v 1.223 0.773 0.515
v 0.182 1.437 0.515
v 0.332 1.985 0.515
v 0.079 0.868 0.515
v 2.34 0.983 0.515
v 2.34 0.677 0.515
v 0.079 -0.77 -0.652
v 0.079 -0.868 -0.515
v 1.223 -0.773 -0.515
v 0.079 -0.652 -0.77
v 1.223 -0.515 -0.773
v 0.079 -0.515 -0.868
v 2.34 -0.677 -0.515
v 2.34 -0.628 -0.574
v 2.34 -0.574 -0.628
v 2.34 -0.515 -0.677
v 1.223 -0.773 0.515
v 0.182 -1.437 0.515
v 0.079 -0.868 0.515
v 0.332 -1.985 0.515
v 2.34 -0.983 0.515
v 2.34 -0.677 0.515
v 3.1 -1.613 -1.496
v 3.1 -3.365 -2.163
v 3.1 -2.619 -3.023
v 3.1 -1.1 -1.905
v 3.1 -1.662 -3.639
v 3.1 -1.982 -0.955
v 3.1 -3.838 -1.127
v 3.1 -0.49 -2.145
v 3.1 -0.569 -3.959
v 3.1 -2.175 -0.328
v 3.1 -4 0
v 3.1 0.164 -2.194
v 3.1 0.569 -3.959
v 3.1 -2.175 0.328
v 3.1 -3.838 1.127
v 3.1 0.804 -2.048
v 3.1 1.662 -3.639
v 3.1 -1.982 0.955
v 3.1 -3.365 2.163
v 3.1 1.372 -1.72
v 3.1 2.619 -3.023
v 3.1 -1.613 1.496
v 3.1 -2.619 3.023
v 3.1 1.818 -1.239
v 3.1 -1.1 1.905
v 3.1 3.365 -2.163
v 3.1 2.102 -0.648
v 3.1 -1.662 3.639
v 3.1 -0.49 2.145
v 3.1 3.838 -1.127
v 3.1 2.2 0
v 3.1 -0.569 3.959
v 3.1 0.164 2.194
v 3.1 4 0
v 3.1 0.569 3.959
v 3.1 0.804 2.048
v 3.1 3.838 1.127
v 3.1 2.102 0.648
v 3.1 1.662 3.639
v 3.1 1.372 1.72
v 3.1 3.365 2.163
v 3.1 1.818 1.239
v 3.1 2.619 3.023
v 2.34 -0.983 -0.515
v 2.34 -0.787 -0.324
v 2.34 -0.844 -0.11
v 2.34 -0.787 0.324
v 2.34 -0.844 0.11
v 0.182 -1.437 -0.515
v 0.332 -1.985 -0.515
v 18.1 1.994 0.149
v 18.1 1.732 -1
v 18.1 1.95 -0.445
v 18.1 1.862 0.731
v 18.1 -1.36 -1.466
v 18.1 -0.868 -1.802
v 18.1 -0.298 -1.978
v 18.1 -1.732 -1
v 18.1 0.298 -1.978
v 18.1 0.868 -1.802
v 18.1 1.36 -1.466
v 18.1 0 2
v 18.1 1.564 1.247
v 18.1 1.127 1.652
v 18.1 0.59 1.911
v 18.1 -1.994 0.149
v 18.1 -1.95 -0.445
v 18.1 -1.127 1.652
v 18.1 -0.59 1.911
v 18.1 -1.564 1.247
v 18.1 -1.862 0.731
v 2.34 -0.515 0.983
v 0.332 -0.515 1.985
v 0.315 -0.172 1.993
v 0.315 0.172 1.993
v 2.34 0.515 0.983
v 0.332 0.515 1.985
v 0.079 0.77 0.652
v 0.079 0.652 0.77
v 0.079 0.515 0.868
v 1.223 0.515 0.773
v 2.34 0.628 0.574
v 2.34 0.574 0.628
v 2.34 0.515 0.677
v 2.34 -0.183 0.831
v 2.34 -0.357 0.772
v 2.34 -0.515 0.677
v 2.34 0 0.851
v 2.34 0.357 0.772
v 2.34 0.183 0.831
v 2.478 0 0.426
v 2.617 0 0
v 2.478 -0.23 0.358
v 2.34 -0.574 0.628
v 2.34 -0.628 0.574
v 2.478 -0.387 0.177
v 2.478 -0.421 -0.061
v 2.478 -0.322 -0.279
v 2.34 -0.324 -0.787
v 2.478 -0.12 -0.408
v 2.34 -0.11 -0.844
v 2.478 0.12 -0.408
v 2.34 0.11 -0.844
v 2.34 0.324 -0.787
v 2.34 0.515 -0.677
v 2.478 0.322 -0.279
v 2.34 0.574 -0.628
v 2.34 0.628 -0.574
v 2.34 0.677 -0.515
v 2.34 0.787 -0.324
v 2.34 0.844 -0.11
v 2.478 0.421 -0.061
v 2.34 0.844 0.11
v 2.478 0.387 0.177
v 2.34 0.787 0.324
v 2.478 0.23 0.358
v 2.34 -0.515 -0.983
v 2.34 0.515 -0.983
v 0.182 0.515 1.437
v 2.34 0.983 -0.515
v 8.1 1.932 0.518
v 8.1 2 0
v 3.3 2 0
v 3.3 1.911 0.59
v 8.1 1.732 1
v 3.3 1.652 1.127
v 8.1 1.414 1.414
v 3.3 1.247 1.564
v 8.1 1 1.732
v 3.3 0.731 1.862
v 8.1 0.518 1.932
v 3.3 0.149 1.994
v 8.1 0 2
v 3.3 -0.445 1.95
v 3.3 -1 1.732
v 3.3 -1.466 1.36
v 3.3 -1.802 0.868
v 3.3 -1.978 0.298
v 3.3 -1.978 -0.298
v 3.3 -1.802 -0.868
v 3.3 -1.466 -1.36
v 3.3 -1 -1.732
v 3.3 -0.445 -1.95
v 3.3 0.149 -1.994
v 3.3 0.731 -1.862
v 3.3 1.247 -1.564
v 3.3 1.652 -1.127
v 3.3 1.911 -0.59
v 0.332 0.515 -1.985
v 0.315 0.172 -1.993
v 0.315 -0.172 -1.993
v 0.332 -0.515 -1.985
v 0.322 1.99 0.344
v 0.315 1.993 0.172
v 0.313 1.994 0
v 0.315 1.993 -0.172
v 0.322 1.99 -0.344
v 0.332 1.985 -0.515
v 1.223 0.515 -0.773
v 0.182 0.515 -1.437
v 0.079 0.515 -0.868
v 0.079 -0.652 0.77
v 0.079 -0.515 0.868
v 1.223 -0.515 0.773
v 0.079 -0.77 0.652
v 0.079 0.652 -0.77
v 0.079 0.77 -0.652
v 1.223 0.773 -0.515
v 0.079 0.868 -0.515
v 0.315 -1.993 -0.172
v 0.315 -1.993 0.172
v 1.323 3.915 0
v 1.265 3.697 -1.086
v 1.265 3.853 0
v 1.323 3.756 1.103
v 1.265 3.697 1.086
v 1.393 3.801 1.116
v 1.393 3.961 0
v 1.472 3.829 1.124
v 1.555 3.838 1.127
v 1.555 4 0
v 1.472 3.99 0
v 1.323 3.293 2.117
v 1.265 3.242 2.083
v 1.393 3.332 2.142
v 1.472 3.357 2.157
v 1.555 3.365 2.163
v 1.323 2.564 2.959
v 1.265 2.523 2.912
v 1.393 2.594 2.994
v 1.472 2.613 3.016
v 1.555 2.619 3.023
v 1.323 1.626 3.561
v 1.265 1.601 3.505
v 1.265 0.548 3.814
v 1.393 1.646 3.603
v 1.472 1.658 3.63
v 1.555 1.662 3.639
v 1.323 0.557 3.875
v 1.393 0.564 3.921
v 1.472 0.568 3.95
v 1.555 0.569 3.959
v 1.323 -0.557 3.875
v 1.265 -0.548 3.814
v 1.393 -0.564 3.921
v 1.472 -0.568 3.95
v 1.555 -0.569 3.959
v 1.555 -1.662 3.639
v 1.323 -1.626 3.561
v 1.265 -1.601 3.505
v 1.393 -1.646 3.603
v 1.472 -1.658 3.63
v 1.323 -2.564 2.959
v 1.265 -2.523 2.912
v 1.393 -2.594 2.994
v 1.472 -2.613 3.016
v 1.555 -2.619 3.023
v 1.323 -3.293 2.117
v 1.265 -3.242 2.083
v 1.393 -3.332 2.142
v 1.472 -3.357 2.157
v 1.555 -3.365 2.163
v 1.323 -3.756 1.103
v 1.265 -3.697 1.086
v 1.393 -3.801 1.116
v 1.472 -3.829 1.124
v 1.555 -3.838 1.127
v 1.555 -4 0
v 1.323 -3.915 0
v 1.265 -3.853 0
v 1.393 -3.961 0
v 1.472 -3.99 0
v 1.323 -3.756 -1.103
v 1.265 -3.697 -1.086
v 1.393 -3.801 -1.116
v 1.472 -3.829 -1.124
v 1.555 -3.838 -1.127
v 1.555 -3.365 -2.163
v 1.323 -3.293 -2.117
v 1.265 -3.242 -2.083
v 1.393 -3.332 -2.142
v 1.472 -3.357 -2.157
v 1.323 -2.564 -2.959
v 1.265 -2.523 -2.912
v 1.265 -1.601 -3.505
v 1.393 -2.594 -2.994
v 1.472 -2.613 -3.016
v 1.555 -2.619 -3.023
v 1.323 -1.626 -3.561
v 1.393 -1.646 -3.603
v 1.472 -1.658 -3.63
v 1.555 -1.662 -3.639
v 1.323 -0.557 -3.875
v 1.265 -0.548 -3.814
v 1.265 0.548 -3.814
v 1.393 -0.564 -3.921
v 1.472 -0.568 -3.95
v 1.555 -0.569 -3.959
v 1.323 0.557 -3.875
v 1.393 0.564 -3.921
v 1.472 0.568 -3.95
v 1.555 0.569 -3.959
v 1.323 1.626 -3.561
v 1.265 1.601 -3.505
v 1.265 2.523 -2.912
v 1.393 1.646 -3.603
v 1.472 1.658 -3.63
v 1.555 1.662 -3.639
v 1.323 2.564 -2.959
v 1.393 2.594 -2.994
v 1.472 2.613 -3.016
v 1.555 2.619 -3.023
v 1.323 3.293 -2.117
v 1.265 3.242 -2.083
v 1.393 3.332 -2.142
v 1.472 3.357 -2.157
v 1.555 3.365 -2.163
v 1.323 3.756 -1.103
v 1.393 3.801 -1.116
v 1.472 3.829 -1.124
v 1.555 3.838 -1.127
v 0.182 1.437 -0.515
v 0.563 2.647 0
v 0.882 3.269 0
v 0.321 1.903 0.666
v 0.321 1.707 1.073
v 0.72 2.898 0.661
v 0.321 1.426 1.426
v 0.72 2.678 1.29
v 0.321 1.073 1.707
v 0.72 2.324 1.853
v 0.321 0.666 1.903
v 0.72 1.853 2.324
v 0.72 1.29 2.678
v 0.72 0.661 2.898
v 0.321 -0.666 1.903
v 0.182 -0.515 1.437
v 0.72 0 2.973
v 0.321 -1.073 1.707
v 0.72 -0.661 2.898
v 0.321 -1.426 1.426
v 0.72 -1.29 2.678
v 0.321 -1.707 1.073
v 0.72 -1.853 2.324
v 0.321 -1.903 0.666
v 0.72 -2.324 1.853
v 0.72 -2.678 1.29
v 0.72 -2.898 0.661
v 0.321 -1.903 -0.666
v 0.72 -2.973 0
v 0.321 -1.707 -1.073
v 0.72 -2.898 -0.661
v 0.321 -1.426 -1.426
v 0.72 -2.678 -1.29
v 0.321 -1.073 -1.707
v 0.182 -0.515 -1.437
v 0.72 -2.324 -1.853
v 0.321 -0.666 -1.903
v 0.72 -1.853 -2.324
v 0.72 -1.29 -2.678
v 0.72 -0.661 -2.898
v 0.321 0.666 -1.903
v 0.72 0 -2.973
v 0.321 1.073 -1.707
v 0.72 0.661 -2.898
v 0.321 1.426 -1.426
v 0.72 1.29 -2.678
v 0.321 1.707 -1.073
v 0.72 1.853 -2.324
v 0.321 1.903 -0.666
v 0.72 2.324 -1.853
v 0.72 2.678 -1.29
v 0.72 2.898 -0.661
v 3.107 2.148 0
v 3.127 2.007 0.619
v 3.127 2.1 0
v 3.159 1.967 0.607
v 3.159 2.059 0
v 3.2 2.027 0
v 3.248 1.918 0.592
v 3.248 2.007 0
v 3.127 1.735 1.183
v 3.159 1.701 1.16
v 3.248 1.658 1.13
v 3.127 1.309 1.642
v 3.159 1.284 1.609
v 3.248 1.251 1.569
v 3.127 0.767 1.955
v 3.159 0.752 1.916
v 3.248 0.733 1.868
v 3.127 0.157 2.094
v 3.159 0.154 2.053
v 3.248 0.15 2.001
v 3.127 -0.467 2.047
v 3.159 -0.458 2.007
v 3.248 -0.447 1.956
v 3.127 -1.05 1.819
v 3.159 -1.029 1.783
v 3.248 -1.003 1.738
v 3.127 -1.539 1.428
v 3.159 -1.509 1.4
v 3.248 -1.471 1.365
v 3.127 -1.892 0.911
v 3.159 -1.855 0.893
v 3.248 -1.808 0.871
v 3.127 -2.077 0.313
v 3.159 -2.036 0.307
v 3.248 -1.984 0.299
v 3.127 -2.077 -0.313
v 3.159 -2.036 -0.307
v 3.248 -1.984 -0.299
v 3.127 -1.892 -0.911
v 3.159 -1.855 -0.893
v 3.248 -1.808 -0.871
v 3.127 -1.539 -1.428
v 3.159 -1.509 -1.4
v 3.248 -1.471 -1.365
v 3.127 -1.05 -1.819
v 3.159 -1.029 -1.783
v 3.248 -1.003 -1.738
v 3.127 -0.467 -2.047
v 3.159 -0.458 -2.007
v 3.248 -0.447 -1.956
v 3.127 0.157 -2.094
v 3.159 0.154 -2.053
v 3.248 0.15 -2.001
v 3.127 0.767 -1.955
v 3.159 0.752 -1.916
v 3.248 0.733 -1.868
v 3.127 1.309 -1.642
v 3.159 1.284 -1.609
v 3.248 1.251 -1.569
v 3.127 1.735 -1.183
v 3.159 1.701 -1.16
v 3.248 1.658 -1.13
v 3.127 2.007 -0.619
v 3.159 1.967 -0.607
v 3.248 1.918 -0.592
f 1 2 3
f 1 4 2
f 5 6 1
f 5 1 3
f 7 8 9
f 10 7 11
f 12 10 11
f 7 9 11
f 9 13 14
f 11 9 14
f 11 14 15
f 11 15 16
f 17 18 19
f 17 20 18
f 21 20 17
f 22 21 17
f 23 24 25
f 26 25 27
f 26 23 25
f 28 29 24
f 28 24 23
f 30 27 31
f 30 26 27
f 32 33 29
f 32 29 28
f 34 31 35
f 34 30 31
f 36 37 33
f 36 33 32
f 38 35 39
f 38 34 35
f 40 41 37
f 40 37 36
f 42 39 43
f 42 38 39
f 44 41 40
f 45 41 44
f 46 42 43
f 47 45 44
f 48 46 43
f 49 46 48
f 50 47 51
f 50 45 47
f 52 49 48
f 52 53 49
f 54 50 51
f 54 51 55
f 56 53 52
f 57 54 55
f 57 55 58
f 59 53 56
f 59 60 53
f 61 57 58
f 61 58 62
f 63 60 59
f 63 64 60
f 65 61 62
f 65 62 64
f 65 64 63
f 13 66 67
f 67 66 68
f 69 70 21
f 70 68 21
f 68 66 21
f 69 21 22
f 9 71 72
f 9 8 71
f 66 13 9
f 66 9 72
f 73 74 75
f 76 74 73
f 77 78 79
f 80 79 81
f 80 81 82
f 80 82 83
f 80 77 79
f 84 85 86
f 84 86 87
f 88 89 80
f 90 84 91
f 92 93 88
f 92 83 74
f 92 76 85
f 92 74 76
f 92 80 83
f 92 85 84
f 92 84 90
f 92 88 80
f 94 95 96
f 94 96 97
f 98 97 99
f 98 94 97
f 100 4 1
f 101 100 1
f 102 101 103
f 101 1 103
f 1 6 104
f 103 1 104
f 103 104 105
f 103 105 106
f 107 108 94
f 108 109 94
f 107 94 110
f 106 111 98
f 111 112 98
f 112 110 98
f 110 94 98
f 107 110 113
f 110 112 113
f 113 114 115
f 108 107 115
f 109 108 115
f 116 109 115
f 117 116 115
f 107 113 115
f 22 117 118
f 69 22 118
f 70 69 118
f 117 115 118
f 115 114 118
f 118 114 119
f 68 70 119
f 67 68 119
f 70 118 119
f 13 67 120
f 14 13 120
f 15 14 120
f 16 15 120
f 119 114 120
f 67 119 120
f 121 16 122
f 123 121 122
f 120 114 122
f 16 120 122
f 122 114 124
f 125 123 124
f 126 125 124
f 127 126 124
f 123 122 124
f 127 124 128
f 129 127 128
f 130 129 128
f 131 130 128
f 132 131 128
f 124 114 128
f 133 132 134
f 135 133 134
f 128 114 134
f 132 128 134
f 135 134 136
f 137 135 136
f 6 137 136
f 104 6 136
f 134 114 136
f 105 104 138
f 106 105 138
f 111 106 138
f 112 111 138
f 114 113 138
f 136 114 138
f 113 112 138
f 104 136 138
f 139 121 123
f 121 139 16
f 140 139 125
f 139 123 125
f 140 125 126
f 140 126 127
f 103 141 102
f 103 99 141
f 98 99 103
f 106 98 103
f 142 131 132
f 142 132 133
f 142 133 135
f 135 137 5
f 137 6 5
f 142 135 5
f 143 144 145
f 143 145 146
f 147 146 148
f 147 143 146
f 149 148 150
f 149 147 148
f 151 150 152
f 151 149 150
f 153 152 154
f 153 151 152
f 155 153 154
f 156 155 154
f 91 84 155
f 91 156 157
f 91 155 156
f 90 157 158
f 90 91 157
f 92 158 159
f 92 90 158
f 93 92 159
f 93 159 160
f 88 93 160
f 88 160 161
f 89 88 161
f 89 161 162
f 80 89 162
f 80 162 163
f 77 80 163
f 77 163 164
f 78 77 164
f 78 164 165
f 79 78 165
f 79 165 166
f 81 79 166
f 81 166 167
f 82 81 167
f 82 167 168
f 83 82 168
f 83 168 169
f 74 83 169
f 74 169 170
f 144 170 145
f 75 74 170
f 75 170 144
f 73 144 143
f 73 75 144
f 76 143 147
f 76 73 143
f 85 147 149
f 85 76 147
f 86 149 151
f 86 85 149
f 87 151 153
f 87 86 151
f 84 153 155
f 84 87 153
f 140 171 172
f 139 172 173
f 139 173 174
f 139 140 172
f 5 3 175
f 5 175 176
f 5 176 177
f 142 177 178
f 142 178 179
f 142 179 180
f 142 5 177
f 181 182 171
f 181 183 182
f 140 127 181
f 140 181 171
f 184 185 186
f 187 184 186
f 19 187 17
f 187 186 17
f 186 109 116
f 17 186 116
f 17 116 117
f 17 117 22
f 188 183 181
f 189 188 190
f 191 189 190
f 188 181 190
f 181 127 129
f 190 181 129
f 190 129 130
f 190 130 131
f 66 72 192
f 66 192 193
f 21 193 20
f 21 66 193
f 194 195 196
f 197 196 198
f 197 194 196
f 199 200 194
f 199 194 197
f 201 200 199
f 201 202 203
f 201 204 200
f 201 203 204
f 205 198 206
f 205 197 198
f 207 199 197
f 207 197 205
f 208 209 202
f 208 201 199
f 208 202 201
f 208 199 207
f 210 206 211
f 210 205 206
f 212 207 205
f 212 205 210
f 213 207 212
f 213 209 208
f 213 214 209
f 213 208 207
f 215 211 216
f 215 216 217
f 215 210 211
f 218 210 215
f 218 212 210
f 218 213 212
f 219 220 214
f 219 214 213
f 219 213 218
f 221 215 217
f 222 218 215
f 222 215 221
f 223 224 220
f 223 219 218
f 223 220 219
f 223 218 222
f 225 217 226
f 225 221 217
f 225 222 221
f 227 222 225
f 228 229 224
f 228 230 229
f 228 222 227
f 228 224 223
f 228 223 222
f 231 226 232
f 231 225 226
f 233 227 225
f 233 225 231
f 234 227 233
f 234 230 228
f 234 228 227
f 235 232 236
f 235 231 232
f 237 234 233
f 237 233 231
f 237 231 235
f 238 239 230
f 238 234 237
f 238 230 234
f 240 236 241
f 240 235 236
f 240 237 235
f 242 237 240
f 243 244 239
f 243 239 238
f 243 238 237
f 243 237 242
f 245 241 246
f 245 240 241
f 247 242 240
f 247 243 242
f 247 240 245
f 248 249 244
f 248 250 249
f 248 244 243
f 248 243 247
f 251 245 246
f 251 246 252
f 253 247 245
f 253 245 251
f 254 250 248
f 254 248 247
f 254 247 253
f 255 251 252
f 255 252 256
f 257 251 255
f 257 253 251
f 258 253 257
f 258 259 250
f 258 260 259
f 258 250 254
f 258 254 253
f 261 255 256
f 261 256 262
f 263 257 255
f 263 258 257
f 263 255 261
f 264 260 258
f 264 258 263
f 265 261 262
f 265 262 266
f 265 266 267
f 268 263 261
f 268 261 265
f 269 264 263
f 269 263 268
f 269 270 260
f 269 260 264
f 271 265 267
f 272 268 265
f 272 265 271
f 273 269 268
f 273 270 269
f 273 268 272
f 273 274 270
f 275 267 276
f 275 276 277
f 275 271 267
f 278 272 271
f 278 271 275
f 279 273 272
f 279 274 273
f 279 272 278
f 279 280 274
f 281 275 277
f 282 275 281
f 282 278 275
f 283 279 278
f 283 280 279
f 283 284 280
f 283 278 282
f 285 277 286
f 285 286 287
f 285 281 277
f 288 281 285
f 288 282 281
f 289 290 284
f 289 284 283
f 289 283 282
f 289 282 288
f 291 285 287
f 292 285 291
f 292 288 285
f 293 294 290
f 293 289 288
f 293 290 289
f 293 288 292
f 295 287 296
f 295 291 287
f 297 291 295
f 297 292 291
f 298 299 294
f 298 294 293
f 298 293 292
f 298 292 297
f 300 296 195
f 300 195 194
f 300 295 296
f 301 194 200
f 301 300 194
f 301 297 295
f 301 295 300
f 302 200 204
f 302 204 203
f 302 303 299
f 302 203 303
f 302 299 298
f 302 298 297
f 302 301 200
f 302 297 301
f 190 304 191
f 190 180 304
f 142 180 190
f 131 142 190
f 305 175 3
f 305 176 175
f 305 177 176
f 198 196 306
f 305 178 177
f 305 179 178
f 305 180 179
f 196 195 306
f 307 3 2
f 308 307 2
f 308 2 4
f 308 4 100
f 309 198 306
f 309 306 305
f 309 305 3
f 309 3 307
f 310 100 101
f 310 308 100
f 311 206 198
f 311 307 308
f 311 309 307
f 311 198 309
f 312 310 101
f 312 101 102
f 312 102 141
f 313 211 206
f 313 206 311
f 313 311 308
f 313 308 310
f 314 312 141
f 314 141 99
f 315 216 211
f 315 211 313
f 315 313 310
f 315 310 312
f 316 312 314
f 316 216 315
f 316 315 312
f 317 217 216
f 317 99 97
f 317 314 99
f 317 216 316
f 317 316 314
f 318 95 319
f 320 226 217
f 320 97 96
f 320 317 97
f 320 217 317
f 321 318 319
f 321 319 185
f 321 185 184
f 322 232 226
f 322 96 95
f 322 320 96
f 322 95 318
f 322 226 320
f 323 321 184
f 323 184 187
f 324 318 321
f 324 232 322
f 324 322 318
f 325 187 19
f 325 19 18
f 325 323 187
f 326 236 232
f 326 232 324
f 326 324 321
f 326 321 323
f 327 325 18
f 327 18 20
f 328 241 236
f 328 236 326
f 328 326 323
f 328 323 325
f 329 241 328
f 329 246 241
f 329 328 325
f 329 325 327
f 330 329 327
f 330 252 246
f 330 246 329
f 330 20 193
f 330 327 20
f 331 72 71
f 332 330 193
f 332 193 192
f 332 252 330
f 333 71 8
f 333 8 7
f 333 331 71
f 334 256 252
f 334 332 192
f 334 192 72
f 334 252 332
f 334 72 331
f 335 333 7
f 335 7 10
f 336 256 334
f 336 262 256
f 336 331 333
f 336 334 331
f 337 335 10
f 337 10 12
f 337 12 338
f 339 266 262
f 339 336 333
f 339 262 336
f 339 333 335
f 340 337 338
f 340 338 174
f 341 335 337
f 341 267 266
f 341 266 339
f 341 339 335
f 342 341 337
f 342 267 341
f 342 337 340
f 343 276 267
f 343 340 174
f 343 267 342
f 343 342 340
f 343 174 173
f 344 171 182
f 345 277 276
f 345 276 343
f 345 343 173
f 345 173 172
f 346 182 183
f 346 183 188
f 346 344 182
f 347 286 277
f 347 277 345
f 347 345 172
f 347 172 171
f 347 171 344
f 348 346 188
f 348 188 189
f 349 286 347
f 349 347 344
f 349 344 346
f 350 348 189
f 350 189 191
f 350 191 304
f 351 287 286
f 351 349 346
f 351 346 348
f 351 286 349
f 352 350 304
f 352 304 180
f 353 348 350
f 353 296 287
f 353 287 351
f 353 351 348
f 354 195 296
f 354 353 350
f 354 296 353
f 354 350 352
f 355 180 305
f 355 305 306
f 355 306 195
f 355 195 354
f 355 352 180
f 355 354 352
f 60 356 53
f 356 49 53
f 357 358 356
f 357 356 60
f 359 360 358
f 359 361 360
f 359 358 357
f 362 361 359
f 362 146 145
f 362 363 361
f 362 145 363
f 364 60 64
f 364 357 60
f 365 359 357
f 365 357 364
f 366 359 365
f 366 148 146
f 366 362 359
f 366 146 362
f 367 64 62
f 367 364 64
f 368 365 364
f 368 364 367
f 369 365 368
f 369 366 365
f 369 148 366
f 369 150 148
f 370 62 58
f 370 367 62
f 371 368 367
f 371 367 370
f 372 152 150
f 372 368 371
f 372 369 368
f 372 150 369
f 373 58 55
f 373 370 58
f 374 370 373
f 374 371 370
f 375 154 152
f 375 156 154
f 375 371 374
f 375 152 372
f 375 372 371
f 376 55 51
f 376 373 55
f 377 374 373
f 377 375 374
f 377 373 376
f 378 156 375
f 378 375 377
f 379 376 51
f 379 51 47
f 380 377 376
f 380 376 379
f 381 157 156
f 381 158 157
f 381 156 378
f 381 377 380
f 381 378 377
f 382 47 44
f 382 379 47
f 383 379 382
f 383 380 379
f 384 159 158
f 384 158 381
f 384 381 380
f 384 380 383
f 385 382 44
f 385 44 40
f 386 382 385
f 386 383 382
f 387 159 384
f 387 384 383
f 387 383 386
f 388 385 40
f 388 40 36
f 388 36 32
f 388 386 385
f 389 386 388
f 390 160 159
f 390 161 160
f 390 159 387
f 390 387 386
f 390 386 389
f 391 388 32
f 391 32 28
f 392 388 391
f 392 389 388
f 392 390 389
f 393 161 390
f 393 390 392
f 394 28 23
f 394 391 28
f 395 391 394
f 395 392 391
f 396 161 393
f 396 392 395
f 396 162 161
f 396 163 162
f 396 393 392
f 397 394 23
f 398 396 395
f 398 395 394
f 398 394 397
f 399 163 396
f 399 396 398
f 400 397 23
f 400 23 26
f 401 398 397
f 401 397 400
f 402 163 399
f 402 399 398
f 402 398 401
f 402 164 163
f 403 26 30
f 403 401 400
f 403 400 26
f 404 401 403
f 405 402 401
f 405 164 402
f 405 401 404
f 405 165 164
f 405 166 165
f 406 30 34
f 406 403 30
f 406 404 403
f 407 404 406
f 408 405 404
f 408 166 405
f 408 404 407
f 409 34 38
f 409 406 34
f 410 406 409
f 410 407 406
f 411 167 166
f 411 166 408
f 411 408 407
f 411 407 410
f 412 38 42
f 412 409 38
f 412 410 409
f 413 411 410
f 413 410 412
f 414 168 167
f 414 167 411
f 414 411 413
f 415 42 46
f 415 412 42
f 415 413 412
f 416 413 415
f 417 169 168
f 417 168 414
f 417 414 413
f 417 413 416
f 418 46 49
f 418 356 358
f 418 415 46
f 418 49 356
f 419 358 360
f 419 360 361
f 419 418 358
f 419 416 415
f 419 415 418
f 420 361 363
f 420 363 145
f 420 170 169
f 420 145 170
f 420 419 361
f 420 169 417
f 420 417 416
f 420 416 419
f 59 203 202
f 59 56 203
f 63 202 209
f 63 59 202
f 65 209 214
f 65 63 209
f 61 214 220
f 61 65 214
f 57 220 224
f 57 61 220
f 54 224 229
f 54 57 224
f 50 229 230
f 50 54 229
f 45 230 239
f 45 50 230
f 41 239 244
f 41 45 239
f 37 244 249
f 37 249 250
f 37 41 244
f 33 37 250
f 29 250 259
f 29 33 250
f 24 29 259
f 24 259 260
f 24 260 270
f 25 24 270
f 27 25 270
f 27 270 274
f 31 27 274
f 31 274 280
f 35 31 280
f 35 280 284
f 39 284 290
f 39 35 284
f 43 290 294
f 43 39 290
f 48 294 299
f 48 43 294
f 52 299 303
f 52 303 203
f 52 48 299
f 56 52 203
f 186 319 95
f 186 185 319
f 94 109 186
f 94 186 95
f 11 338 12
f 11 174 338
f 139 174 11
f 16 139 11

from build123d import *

# Parameters (mm, degrees)
RECPAT_COUNT       = 2
RECPAT_ANGLE       = 90
BOSS_EXTRU_1_START = 10
ESQUISSE1_R        = 2
BOSS_EXTRU_1_DEPTH = 10


with BuildPart() as part:
    # Fillet1: read off the stored shape, not the designer's step
    # Fillet1 outline → Fillet1 (revolve)
    with BuildSketch(Plane.YX):
        with BuildLine():
            Line((2, 3.3), (2, 8.1))
            Line((2, 8.1), (0, 8.1))
            Line((0, 8.1), (0, 0))
            ThreePointArc((0, 0), (2.027933458, 0.324444488), (3.853420198, 1.265388956))
            ThreePointArc((3.853420198, 1.265388956), (3.961271902, 1.392873227), (4, 1.555305874))
            Line((4, 1.555305874), (4, 3.1))
            Line((4, 3.1), (2.2, 3.1))
            ThreePointArc((2.2, 3.1), (2.058578644, 3.158578644), (2, 3.3))
        make_face()
    revolve(axis=Axis((0, 0, 0), (1, 0, 0)))

    # Sketch3 → Recess section 0
    with BuildSketch(Plane(origin=(0, 0, 0), x_dir=(0, 0, -1), z_dir=(1, 0, 0))):
        with BuildLine():
            Line((0.515, -2.15), (-0.515, -2.15))
            Line((-0.515, -2.15), (-0.515, 2.15))
            Line((-0.515, 2.15), (0.515, 2.15))
            Line((0.515, 2.15), (0.515, -2.15))
        make_face()
    # Sketch4 → Recess section 1
    with BuildSketch(Plane(origin=(2.34, 0, 0), x_dir=(0, 0, -1), z_dir=(1, 0, 0))):
        with BuildLine():
            Line((0.515, -0.983319232), (-0.515, -0.983319232))
            Line((-0.515, -0.983319232), (-0.515, 0.983319232))
            Line((-0.515, 0.983319232), (0.515, 0.983319232))
            Line((0.515, 0.983319232), (0.515, -0.983319232))
        make_face()
    recess = loft(mode=Mode.SUBTRACT)

    # RecPat: Recess ×2 about axis
    recpat_axis = Axis((0, 0, 0), (1, 0, 0))
    for i in range(1, RECPAT_COUNT):
        add(recess.rotate(recpat_axis, i * RECPAT_ANGLE / (RECPAT_COUNT - 1)), mode=Mode.SUBTRACT)

    # RecCorSke → RecessCore (revolve, cut)
    with BuildSketch(Plane.XY, mode=Mode.PRIVATE) as recesscore_sk:
        Polygon((0, 0), (0, 1.01462874), (2.34, 0.851), (2.616506661, 0), align=None)
    revolve(recesscore_sk.sketch.rotate(Axis((-3.175, 0, 0), (1, 0, 0)), 90), axis=Axis((-3.175, 0, 0), (1, 0, 0)), mode=Mode.SUBTRACT)

    # Esquisse1 → Boss.-Extru.1 (add)
    with BuildSketch(Plane(origin=(8.1, 0, 0), x_dir=(0, 0, -1), z_dir=(1, 0, 0)).offset(BOSS_EXTRU_1_START)):
        with Locations(Location((0, 0, 0), (0, 0, 180))):
            Circle(ESQUISSE1_R)
    extrude(amount=-BOSS_EXTRU_1_DEPTH)


solid = part.part
